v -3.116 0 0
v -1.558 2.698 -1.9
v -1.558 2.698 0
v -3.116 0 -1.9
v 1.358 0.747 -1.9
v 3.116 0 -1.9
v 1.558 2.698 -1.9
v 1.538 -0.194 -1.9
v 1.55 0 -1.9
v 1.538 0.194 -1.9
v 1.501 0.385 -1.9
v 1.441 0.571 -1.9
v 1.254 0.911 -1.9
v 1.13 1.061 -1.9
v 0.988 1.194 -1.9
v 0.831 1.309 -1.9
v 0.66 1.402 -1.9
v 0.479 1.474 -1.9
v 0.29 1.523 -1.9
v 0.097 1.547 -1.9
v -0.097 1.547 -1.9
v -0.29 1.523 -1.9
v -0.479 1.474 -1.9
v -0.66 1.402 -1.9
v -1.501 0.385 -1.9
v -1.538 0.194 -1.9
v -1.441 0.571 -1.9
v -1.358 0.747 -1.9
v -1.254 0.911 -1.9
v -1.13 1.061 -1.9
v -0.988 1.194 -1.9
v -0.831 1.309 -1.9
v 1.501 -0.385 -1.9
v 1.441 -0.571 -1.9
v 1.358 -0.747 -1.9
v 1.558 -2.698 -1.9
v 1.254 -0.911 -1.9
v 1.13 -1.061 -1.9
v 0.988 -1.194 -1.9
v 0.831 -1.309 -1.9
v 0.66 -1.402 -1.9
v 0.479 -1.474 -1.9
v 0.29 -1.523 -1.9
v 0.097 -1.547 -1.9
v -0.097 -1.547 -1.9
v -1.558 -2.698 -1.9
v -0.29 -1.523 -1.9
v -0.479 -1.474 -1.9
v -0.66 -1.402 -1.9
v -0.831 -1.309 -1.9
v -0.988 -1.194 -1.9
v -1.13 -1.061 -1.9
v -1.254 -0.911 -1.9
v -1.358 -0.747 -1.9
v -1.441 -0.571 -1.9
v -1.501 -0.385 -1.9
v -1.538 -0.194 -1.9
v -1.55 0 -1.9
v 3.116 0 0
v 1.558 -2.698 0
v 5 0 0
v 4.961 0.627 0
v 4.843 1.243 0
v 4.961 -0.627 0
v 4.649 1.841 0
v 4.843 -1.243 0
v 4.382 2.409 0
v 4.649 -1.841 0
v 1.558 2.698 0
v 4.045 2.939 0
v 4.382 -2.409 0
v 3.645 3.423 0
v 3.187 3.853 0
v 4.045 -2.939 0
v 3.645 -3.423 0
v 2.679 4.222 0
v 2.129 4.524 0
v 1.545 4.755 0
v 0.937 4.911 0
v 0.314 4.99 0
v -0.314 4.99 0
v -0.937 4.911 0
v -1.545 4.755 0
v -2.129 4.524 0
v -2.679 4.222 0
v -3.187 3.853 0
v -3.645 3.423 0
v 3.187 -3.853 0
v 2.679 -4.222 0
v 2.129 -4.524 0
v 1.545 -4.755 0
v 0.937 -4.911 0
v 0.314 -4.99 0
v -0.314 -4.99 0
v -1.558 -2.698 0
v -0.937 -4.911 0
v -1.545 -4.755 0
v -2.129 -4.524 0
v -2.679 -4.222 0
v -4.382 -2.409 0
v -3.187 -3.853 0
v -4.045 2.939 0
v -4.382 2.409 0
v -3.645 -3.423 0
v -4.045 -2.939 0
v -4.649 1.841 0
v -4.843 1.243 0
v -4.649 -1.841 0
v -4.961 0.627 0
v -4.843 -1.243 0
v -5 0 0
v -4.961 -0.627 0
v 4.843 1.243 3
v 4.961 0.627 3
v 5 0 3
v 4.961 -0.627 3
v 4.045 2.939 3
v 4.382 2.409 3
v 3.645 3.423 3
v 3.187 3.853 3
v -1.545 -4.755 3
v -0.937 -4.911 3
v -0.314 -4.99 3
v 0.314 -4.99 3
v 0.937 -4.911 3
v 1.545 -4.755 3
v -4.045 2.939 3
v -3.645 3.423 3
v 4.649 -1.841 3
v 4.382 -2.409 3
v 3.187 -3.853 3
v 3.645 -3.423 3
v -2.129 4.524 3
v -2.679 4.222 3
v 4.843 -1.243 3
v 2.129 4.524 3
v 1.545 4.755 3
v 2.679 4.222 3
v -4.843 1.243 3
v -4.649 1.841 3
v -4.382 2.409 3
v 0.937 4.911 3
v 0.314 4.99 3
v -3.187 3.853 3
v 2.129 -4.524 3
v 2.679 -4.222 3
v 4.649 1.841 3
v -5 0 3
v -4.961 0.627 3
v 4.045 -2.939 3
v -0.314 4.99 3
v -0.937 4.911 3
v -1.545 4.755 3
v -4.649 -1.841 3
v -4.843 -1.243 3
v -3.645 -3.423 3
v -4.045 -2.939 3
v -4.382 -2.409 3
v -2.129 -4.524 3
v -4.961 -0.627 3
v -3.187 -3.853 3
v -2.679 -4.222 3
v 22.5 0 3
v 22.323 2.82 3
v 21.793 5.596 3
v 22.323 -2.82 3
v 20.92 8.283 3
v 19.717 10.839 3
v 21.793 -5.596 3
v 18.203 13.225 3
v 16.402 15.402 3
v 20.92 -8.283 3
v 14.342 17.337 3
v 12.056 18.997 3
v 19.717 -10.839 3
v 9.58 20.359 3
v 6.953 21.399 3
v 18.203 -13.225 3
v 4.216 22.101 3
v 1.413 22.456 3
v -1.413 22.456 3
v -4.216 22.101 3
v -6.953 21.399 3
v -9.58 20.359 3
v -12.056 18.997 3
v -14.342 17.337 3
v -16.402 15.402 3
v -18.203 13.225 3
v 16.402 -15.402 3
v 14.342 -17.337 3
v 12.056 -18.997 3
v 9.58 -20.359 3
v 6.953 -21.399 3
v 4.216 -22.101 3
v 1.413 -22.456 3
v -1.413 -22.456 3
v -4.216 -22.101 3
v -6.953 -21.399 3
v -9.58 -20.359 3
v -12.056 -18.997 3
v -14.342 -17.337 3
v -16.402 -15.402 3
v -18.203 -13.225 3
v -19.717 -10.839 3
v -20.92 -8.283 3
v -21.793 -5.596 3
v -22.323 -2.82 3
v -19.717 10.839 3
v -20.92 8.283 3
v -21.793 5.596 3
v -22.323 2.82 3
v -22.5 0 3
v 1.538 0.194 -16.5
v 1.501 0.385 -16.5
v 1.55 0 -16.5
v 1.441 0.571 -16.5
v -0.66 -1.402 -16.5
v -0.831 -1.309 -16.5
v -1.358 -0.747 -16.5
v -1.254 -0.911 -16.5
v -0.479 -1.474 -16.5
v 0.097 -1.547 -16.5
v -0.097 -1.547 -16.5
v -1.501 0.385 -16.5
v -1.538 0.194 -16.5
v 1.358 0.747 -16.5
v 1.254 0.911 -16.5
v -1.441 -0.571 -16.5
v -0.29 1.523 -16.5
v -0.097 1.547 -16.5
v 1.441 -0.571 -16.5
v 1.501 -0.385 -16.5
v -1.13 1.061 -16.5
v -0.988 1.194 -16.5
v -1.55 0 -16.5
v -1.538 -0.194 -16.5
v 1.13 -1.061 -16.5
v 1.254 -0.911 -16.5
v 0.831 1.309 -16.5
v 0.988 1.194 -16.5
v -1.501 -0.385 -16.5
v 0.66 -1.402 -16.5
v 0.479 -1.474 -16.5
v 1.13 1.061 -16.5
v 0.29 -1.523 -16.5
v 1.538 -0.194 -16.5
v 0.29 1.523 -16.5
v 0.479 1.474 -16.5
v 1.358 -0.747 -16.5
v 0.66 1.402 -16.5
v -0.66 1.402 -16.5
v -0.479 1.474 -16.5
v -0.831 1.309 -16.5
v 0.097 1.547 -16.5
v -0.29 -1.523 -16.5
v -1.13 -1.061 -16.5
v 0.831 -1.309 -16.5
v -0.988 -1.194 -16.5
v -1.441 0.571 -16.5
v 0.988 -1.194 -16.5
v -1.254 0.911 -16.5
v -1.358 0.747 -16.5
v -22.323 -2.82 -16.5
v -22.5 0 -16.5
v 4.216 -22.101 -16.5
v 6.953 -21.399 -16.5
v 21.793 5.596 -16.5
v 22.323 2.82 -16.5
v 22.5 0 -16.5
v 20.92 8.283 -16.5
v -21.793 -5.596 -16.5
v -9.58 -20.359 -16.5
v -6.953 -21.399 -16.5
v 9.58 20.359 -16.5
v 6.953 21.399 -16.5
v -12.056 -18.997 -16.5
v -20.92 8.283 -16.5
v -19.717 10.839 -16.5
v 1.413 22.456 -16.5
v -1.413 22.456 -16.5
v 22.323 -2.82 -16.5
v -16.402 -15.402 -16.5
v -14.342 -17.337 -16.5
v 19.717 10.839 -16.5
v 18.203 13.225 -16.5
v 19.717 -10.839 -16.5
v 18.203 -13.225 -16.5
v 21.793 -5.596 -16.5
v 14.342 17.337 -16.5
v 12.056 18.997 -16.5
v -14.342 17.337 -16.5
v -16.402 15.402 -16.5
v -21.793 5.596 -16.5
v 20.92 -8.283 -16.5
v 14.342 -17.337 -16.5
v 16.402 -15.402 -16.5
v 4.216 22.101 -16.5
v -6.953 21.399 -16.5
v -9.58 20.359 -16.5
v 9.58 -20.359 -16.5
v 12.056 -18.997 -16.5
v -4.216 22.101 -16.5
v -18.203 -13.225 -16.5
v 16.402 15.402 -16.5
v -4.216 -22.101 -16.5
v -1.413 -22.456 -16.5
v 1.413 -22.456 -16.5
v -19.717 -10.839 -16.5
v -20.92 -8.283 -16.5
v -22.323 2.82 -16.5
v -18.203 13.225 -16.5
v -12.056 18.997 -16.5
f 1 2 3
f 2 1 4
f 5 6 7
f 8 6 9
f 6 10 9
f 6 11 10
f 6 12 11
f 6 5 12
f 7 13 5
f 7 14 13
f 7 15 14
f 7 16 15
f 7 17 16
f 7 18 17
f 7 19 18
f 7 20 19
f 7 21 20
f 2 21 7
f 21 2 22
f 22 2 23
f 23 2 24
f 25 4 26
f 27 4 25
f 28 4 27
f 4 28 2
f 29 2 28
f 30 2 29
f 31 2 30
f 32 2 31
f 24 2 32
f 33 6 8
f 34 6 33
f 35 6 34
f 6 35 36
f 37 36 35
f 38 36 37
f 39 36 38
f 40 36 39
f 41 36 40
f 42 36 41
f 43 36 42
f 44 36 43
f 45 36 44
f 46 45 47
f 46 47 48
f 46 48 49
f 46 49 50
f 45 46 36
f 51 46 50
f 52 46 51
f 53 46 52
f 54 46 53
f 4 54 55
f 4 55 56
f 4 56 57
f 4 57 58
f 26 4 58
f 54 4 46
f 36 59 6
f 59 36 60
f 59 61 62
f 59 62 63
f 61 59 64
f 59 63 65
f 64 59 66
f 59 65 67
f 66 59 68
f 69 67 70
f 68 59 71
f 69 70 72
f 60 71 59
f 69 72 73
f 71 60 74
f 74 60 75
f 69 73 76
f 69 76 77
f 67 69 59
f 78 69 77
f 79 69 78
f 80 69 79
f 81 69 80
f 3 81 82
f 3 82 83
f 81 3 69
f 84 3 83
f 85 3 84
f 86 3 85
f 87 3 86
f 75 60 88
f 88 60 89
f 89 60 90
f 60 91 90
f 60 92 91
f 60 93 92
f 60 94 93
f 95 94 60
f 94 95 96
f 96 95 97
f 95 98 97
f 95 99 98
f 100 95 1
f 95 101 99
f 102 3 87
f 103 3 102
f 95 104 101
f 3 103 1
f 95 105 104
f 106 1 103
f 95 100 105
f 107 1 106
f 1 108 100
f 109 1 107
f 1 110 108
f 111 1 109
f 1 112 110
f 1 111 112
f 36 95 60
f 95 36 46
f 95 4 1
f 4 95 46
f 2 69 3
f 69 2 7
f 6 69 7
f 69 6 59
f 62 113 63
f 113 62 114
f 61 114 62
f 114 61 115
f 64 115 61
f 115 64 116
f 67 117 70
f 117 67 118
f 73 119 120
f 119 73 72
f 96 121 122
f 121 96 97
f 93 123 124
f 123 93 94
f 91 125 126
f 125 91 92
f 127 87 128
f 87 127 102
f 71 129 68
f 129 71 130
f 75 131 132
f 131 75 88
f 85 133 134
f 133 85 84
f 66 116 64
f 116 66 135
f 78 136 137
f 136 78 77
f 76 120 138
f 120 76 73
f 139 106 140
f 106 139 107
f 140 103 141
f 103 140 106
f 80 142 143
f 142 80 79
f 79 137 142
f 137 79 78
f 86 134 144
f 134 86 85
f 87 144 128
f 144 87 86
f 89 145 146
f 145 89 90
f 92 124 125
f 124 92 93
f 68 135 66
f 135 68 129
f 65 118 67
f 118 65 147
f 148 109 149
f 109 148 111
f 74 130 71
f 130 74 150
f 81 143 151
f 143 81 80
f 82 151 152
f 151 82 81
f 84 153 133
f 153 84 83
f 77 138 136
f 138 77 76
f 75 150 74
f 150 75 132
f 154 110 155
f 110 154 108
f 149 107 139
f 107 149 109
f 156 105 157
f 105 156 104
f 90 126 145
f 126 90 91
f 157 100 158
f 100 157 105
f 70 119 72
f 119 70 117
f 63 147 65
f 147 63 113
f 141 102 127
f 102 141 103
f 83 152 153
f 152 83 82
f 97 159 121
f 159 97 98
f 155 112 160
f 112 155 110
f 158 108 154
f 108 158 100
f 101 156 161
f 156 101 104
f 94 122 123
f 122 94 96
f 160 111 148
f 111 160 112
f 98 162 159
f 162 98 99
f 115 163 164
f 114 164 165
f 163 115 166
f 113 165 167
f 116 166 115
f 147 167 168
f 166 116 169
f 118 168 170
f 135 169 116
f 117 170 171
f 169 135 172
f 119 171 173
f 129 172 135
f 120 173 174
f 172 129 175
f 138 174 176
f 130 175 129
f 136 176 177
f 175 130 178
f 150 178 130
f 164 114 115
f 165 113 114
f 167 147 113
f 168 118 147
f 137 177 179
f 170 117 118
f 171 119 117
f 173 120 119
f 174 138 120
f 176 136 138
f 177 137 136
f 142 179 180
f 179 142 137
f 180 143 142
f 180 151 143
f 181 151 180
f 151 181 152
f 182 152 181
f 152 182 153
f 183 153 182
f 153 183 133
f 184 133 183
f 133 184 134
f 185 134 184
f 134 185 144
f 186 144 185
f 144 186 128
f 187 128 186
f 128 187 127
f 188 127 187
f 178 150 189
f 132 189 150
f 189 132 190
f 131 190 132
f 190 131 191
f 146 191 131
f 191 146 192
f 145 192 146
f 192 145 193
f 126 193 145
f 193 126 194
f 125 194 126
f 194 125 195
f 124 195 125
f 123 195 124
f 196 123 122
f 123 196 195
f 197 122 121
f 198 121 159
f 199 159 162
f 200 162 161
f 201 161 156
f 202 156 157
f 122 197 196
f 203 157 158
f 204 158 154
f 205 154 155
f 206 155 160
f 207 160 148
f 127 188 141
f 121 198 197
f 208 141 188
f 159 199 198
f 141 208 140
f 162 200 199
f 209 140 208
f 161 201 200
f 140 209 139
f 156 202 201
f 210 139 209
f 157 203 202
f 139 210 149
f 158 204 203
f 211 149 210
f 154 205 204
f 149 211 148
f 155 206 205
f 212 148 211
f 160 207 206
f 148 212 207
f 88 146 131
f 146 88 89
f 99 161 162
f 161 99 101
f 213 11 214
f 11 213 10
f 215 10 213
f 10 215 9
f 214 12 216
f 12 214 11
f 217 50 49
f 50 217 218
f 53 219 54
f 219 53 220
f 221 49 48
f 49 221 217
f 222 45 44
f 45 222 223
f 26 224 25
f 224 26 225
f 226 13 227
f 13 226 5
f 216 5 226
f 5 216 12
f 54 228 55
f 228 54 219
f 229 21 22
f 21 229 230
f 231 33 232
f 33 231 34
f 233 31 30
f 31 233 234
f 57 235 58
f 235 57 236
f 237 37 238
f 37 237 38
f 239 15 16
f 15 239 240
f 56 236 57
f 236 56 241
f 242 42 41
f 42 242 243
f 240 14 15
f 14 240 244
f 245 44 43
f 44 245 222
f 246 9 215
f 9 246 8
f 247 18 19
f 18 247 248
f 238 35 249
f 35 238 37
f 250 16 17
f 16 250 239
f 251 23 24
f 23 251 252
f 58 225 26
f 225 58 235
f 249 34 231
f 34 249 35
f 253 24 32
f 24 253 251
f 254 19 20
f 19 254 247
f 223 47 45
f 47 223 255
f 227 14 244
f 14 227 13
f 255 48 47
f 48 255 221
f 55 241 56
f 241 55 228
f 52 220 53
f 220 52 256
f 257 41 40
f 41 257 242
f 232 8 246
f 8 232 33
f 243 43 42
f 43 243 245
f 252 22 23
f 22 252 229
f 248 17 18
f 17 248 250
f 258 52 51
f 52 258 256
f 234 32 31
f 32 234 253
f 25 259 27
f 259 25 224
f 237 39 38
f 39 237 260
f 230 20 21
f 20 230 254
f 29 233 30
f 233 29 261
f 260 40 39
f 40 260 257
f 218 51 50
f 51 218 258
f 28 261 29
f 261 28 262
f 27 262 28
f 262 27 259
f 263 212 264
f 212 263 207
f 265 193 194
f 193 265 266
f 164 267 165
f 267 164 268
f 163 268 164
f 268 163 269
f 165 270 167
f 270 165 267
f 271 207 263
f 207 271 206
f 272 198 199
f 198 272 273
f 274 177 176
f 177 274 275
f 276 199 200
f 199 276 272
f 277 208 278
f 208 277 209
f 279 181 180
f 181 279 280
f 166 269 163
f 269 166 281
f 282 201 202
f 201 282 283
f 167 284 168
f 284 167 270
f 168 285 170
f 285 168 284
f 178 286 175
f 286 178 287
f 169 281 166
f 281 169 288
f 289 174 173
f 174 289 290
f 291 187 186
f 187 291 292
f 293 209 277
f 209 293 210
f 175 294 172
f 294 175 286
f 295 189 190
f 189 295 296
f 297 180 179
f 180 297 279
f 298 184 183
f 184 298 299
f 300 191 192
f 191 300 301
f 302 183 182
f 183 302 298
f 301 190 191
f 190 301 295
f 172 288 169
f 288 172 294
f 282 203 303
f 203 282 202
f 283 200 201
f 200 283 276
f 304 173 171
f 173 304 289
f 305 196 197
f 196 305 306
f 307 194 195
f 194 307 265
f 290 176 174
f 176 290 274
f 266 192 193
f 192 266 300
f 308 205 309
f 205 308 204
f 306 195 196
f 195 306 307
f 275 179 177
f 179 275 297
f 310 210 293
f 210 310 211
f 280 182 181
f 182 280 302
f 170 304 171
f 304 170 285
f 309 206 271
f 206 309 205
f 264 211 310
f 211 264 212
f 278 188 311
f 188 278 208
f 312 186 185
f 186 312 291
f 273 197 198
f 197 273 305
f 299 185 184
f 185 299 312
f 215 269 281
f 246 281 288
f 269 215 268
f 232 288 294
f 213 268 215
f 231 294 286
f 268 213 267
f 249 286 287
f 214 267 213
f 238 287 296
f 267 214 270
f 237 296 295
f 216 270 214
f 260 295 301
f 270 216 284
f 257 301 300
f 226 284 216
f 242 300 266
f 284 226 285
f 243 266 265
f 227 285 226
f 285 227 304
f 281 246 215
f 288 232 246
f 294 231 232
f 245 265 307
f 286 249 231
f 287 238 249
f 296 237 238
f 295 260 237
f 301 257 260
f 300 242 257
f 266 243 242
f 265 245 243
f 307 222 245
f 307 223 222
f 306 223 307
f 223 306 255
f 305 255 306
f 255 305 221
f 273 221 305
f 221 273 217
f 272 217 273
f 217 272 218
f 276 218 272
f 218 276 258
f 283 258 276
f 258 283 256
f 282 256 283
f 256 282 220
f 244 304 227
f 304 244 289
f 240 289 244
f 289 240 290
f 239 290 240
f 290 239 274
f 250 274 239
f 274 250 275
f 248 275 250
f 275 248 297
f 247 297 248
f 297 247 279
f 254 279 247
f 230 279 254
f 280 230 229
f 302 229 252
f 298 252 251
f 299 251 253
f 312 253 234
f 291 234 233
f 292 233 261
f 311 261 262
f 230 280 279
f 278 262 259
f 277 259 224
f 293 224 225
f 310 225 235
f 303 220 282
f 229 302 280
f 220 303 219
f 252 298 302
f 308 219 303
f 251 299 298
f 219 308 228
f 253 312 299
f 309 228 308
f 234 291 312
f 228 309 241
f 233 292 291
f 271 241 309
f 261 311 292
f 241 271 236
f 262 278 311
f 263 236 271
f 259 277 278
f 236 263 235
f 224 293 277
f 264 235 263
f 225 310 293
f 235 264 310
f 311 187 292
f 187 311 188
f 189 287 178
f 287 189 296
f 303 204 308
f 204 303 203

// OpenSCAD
$fn = 50;

difference() {
	union() {
		translate(v = [0, 0, -16.5]) {
			cylinder(h = 19.5, r = 22.5);
		}
	}
	union() {
		translate(v = [0, 0, 0]) {
			rotate(a = [0, 0, 0]) {
				difference() {
					union() {
						translate(v = [0, 0, -1.9]) {
							linear_extrude(height = 1.9) {
								polygon(points = [[3.1158, 0.0], [1.5579000000000005, 2.698361953111554], [-1.5578999999999994, 2.6983619531115544], [-3.1158, 3.815754496783323e-16], [-1.5579000000000014, -2.6983619531115535], [1.557899999999998, -2.6983619531115552]]);
							}
						}
					}
					union();
				}
			}
		}
		#cylinder(h = 3, r = 5.0);
		#translate(v = [0, 0, -100.0]) {
			cylinder(h = 200, r = 1.55);
		}
	}
}
